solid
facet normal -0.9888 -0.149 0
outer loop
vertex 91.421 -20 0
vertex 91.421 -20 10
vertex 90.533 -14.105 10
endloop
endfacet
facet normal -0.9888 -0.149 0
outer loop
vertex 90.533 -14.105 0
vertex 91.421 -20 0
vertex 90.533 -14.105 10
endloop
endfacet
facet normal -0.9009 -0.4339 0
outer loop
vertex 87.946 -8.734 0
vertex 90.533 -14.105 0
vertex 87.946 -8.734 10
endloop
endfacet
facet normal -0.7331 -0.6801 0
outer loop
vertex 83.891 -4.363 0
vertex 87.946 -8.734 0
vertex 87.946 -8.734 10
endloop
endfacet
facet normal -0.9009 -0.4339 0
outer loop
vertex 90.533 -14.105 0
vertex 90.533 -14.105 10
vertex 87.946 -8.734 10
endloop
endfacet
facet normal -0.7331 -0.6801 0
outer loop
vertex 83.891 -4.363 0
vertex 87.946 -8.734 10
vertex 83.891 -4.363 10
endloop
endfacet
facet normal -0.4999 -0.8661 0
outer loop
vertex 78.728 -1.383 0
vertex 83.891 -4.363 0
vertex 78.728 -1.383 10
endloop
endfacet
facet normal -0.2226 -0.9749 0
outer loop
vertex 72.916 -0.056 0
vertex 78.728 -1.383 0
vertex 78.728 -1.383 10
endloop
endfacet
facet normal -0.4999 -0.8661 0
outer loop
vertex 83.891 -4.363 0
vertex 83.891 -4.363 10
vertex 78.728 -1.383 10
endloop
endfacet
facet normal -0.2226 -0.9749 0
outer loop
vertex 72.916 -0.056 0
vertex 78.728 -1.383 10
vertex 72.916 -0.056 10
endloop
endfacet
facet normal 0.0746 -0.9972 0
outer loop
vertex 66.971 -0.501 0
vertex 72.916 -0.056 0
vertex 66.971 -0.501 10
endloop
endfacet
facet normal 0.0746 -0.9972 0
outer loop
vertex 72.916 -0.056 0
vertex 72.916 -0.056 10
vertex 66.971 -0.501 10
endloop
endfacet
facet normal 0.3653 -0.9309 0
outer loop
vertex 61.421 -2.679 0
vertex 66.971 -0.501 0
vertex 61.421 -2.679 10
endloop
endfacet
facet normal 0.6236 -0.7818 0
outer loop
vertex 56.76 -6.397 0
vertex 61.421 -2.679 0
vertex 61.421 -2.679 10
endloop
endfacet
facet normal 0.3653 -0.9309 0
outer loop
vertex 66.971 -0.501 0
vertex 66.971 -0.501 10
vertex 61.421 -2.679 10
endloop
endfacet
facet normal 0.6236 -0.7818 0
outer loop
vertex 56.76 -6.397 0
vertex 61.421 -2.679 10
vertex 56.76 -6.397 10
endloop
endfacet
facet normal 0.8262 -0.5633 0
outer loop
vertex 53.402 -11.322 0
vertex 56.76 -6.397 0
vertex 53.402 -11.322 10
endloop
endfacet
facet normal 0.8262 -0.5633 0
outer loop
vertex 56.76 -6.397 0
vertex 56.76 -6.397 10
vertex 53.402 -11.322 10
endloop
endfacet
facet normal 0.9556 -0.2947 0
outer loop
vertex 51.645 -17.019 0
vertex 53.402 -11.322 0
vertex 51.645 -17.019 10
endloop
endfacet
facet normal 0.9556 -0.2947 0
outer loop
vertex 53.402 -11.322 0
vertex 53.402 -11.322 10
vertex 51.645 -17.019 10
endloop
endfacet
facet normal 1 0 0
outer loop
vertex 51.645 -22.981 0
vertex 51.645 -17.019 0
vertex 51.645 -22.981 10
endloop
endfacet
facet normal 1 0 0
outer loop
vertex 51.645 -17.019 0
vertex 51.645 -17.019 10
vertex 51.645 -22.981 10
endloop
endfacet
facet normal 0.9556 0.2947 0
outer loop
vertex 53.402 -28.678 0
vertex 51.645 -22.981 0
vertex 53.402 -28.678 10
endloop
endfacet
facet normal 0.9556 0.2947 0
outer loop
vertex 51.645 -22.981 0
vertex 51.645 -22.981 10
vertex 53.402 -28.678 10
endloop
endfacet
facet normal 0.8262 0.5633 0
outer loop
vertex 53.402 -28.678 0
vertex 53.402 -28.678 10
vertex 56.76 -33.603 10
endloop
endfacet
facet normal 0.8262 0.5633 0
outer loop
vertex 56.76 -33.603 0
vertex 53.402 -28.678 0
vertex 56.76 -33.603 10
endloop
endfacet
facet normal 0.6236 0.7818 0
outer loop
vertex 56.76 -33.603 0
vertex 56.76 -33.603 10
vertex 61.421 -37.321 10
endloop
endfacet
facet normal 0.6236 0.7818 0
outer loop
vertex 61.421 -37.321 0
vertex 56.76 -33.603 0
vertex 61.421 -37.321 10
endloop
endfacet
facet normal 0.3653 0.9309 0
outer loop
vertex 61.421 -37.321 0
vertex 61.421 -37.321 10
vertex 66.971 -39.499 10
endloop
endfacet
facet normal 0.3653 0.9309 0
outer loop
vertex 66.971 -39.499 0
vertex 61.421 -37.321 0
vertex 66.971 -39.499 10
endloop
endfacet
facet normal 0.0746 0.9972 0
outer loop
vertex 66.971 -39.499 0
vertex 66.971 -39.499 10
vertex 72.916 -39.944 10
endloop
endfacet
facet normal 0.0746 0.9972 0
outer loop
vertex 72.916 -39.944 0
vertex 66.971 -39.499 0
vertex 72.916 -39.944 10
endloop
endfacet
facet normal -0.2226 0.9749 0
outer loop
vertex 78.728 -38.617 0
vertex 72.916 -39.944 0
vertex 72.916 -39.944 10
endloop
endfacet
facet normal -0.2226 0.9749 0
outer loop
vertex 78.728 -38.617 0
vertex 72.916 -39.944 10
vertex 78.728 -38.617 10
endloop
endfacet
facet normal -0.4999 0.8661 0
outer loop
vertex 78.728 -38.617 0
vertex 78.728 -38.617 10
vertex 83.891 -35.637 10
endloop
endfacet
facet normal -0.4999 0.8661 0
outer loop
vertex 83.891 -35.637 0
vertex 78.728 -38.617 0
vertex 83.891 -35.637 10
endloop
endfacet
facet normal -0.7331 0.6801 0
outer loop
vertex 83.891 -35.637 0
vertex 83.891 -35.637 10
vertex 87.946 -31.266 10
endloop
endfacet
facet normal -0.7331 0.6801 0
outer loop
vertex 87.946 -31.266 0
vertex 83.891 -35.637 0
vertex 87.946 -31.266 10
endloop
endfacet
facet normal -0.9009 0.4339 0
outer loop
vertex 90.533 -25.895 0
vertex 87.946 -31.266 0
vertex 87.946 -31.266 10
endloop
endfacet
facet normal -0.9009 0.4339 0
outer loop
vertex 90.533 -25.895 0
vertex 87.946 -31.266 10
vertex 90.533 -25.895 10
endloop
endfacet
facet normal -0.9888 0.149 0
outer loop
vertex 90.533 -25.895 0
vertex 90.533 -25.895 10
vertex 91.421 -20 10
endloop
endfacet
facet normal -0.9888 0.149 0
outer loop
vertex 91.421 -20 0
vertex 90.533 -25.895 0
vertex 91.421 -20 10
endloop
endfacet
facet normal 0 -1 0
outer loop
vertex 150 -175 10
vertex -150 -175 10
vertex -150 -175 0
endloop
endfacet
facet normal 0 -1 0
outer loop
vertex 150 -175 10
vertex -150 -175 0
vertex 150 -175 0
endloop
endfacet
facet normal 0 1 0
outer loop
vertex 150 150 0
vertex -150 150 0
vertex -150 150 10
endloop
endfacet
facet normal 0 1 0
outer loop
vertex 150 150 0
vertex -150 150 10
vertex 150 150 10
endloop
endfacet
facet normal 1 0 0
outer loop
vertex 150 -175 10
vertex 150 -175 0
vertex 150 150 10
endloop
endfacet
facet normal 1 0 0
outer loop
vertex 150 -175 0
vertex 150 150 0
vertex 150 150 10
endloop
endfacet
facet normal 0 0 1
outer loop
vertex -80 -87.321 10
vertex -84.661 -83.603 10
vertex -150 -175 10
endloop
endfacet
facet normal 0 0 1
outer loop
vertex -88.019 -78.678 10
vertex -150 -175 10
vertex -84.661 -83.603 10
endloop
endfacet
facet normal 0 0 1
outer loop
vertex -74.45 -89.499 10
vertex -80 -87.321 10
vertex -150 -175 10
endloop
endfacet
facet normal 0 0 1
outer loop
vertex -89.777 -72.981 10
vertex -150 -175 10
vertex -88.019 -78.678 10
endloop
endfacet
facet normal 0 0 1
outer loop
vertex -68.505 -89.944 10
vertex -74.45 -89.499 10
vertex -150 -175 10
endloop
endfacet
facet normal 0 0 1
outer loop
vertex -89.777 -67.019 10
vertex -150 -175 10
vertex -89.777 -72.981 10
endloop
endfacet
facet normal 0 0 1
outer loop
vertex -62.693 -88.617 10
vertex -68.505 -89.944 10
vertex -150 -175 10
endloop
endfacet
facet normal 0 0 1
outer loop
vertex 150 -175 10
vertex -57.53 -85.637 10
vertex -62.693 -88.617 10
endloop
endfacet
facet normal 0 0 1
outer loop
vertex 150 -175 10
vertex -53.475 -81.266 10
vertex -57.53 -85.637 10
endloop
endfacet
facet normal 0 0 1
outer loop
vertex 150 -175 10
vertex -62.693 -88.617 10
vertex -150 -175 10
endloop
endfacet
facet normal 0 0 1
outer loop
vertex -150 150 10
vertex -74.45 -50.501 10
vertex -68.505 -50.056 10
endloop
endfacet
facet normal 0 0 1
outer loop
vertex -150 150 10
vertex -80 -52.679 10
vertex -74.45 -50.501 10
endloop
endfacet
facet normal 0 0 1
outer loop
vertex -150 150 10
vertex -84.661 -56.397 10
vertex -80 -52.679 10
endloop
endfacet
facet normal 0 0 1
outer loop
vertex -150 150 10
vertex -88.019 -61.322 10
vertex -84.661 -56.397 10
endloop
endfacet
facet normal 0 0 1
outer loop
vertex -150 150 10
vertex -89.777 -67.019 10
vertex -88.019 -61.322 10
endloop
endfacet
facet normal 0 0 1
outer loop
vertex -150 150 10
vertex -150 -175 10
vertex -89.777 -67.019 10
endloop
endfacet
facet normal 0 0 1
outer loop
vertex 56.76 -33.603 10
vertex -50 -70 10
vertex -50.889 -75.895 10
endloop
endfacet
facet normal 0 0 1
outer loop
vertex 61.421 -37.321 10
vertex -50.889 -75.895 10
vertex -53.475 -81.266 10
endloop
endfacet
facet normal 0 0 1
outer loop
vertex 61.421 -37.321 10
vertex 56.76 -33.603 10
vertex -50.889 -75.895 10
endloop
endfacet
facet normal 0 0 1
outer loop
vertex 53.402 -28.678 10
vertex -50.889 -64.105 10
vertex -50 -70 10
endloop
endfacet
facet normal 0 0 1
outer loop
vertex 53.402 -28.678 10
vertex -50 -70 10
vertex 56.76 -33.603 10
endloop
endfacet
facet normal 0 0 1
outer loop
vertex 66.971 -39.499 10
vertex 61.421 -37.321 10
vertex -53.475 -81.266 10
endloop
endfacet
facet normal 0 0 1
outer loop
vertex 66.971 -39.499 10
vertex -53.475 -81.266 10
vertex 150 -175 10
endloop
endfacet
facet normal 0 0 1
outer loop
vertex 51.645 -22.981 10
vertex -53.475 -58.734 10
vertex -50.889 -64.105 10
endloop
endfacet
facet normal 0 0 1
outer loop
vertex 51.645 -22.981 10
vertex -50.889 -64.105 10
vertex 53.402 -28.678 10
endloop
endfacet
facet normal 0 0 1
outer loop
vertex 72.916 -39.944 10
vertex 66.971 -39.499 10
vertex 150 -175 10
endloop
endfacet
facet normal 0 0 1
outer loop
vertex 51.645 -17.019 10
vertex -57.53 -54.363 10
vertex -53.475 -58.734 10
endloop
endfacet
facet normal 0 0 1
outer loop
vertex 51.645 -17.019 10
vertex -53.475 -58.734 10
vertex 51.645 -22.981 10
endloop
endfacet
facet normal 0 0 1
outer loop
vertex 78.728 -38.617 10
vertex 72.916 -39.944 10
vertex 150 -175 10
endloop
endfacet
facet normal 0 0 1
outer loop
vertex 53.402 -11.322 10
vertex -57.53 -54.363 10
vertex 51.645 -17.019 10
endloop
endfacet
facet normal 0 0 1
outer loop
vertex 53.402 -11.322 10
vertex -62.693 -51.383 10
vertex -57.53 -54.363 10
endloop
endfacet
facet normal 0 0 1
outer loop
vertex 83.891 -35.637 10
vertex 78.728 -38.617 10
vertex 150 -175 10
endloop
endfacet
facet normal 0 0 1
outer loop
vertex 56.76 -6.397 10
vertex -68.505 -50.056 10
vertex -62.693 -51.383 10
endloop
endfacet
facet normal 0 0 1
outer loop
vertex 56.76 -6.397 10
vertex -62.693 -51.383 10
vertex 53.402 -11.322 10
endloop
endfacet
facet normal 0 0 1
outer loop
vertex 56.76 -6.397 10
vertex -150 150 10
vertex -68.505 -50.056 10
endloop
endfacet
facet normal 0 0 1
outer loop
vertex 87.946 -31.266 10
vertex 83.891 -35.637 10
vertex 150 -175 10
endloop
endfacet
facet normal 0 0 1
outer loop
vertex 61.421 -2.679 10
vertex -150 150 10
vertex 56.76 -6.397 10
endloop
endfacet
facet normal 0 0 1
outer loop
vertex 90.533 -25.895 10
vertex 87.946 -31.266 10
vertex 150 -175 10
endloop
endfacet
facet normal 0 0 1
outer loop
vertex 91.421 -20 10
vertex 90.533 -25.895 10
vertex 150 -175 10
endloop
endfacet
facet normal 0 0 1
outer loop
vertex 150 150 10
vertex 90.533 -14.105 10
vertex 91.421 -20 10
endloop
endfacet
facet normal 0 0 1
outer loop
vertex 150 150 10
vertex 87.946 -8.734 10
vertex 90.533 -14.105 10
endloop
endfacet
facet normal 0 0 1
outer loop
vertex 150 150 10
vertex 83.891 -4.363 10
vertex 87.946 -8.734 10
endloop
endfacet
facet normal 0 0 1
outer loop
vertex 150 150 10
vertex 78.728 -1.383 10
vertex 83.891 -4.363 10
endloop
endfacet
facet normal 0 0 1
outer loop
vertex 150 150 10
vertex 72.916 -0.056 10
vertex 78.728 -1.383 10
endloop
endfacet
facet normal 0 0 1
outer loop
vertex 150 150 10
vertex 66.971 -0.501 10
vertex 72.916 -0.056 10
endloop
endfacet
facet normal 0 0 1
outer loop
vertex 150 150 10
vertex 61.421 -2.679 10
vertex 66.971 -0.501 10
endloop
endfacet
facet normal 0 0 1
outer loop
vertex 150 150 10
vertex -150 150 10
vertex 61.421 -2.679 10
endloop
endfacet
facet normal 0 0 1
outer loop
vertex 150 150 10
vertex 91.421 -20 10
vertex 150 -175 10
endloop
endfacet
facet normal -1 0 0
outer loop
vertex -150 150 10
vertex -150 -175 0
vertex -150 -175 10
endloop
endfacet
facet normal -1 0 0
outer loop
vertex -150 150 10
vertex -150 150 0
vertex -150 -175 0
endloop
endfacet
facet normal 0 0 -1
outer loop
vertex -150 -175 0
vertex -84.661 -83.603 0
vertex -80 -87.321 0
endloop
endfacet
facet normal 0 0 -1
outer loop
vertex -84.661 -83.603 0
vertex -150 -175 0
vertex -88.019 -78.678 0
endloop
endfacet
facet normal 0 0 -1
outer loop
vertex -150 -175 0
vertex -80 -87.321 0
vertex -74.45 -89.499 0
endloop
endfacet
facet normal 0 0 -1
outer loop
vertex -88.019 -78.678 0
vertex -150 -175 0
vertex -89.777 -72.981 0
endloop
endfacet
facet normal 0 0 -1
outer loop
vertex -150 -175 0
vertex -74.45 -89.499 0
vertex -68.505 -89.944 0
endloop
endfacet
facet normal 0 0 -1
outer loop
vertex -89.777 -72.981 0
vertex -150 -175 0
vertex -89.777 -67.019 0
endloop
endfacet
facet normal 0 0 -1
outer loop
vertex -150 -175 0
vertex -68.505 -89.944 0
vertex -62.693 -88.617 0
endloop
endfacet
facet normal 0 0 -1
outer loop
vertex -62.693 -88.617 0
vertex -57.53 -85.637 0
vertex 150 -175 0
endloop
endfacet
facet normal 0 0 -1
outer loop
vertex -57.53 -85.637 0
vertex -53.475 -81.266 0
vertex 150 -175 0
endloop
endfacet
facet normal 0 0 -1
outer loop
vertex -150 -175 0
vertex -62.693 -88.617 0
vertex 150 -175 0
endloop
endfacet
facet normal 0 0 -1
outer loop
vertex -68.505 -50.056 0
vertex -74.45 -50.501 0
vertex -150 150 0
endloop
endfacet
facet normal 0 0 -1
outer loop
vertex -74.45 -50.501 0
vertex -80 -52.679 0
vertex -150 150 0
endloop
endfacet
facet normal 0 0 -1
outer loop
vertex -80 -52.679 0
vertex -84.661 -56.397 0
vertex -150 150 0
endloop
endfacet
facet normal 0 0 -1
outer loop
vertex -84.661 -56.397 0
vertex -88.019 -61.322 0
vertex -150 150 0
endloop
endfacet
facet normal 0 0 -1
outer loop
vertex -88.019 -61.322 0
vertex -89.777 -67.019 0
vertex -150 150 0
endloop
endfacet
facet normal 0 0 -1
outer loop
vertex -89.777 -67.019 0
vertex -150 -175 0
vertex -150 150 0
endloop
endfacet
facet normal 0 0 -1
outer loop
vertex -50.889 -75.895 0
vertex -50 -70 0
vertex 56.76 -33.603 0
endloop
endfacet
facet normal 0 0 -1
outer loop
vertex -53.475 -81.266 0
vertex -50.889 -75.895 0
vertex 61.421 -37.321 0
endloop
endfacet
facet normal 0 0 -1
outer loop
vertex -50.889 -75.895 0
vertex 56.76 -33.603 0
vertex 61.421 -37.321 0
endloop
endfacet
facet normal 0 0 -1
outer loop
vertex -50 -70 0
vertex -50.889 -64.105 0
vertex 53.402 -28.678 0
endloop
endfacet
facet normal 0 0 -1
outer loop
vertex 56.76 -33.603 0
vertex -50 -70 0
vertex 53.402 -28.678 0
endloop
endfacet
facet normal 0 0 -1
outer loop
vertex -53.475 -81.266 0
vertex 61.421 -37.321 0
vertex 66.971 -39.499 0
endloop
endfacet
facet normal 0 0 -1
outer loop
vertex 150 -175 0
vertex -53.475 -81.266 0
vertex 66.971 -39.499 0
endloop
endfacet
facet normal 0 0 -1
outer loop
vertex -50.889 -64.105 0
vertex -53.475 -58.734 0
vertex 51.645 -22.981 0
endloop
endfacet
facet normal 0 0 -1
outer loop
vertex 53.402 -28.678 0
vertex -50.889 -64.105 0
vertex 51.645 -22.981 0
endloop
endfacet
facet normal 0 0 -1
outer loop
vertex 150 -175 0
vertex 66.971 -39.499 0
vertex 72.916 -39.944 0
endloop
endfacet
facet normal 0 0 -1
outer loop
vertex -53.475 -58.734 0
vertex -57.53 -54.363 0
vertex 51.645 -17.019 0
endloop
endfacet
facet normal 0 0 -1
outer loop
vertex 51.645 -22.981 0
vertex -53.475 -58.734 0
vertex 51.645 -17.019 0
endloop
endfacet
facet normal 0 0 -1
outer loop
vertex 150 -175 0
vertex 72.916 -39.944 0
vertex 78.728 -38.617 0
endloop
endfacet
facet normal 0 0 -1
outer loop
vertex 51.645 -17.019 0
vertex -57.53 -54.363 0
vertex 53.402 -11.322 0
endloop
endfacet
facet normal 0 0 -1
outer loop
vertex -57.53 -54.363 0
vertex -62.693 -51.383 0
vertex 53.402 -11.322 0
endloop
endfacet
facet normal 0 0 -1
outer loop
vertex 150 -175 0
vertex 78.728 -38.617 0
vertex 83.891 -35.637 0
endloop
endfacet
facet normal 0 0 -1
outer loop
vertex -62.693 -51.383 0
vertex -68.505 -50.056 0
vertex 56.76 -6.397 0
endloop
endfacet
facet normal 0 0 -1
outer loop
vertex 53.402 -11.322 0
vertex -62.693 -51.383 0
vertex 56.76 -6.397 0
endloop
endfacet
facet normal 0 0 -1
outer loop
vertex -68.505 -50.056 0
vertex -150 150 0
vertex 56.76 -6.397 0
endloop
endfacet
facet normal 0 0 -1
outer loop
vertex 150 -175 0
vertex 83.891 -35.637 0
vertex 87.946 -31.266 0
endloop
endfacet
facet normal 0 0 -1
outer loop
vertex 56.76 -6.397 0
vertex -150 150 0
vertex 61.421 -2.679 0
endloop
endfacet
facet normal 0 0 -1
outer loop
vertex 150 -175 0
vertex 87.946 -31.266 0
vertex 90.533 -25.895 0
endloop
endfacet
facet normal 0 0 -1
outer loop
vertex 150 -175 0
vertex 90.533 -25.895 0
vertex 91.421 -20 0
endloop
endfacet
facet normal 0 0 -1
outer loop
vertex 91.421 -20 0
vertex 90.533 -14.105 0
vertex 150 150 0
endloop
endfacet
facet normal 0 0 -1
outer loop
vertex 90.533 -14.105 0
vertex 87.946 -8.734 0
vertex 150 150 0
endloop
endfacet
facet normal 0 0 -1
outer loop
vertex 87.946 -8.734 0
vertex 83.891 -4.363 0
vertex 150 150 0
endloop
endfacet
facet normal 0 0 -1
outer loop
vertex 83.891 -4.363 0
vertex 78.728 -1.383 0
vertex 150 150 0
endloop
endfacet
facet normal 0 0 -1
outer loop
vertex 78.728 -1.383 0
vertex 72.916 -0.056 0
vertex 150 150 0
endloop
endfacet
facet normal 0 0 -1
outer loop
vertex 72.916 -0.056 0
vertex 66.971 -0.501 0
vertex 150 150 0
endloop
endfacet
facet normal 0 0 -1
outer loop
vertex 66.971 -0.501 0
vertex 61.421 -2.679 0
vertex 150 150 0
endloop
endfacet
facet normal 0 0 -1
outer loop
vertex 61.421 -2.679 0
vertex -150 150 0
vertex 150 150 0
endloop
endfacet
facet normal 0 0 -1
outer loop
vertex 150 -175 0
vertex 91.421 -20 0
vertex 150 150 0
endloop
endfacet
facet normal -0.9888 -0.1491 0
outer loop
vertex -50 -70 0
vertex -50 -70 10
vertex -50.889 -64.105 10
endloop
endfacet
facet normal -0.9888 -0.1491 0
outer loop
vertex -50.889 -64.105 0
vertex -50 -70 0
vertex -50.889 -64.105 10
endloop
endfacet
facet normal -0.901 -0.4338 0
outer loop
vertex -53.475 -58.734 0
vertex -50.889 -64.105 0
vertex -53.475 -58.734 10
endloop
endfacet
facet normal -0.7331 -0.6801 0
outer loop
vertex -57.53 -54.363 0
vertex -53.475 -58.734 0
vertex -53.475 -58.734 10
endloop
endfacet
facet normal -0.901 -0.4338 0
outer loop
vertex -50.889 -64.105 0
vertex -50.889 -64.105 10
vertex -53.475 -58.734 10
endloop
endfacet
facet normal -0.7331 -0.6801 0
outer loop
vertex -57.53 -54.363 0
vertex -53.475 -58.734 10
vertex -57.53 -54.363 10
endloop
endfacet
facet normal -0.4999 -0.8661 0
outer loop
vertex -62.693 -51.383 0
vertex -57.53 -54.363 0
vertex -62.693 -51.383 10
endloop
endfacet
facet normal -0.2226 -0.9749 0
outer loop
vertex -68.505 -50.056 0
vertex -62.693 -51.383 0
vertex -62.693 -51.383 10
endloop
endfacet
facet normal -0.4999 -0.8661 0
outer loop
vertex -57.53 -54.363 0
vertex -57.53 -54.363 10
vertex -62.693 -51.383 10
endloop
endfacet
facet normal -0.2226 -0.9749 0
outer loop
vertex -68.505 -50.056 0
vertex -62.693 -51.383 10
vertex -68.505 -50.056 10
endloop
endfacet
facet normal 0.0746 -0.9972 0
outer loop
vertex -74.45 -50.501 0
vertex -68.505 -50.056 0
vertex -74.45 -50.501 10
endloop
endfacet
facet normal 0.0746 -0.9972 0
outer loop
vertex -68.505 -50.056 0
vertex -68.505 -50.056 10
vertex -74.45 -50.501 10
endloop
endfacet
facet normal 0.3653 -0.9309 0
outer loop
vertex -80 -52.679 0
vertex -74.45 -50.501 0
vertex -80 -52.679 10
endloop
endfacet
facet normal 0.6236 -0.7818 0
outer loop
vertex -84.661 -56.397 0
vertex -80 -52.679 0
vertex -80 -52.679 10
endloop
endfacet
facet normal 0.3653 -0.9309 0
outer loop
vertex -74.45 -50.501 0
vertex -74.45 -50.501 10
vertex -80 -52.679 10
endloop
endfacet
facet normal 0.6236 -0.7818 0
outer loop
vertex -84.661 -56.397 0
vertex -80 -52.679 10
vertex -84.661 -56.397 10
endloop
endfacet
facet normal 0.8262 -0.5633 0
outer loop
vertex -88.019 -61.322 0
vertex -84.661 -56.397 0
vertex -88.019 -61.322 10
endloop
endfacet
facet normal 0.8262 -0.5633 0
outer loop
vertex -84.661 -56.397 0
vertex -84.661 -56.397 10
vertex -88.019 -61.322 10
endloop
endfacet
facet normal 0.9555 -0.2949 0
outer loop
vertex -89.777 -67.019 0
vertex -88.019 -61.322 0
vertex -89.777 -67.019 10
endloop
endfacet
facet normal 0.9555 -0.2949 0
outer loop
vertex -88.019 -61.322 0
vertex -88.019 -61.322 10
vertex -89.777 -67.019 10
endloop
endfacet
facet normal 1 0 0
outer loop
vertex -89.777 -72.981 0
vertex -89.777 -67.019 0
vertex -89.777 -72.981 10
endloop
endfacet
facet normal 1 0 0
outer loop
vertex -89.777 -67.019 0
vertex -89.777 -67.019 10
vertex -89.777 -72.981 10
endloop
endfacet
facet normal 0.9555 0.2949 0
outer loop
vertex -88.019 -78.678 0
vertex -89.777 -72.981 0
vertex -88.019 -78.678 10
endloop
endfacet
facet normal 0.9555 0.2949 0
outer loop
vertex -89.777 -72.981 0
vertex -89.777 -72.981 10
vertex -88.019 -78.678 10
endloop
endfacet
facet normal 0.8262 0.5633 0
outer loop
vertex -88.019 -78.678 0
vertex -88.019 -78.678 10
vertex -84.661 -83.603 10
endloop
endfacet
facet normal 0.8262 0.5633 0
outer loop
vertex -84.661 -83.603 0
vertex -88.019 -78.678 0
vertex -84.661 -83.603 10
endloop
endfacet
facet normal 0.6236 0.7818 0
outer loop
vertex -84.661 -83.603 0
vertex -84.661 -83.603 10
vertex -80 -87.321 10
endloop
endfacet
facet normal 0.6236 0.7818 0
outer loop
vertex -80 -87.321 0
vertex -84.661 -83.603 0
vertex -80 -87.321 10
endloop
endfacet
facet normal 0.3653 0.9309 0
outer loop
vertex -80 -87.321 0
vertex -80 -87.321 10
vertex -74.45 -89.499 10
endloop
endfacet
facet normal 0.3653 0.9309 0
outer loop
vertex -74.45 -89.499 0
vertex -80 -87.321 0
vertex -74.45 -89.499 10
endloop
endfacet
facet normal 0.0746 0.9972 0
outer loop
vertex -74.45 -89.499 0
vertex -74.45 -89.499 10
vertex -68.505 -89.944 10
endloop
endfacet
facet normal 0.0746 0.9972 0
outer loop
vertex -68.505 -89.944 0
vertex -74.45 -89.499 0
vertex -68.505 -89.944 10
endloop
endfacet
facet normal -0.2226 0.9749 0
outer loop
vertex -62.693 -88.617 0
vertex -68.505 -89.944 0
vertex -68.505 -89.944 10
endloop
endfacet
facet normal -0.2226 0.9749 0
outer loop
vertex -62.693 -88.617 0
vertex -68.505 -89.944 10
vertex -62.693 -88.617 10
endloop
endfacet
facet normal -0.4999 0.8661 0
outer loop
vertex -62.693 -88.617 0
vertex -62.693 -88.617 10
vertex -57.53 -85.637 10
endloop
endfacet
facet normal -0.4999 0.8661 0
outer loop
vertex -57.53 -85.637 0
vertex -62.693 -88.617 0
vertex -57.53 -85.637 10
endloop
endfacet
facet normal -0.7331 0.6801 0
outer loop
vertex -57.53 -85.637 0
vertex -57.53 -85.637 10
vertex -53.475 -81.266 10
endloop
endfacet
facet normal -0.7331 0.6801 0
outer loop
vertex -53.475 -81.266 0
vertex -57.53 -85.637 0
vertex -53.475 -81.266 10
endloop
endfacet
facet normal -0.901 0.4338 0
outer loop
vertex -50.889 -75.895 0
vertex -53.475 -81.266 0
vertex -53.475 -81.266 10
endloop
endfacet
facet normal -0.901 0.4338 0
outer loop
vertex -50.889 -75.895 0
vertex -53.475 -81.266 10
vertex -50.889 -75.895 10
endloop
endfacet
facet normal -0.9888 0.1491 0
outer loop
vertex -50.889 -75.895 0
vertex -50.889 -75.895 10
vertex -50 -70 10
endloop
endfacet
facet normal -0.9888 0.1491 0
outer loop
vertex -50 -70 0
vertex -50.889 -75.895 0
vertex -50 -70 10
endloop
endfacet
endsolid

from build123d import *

# Parameters (mm, degrees)
SKETCH_1_W          = 300
SKETCH_1_H          = 300
EXTRUDE_1_DEPTH     = 10
SKETCH_2_R          = 20
CUT_EXTRUDE_1_DEPTH = 213.367605816
SKETCH_3_W          = 300
SKETCH_3_H          = 10
EXTRUDE_2_DEPTH     = 25


with BuildPart() as part:
    # 草图1 → 凸台-拉伸1 (new body)
    with BuildSketch(Plane.XY):
        Rectangle(SKETCH_1_W, SKETCH_1_H)
    extrude(amount=EXTRUDE_1_DEPTH)

    # 草图2 → 切除-拉伸1 (cut, through all)
    with BuildSketch(Plane.XY.offset(10)):
        with Locations((-70, -70)):
            Circle(SKETCH_2_R)
        with Locations((71.421356237, -20)):
            Circle(SKETCH_2_R)
    extrude(amount=-CUT_EXTRUDE_1_DEPTH, mode=Mode.SUBTRACT)

    # 草图3 → 凸台-拉伸2 (add)
    with BuildSketch(Plane.XZ.offset(150)):
        with Locations((0, 5)):
            Rectangle(SKETCH_3_W, SKETCH_3_H)
    extrude(amount=EXTRUDE_2_DEPTH)


solid = part.part
